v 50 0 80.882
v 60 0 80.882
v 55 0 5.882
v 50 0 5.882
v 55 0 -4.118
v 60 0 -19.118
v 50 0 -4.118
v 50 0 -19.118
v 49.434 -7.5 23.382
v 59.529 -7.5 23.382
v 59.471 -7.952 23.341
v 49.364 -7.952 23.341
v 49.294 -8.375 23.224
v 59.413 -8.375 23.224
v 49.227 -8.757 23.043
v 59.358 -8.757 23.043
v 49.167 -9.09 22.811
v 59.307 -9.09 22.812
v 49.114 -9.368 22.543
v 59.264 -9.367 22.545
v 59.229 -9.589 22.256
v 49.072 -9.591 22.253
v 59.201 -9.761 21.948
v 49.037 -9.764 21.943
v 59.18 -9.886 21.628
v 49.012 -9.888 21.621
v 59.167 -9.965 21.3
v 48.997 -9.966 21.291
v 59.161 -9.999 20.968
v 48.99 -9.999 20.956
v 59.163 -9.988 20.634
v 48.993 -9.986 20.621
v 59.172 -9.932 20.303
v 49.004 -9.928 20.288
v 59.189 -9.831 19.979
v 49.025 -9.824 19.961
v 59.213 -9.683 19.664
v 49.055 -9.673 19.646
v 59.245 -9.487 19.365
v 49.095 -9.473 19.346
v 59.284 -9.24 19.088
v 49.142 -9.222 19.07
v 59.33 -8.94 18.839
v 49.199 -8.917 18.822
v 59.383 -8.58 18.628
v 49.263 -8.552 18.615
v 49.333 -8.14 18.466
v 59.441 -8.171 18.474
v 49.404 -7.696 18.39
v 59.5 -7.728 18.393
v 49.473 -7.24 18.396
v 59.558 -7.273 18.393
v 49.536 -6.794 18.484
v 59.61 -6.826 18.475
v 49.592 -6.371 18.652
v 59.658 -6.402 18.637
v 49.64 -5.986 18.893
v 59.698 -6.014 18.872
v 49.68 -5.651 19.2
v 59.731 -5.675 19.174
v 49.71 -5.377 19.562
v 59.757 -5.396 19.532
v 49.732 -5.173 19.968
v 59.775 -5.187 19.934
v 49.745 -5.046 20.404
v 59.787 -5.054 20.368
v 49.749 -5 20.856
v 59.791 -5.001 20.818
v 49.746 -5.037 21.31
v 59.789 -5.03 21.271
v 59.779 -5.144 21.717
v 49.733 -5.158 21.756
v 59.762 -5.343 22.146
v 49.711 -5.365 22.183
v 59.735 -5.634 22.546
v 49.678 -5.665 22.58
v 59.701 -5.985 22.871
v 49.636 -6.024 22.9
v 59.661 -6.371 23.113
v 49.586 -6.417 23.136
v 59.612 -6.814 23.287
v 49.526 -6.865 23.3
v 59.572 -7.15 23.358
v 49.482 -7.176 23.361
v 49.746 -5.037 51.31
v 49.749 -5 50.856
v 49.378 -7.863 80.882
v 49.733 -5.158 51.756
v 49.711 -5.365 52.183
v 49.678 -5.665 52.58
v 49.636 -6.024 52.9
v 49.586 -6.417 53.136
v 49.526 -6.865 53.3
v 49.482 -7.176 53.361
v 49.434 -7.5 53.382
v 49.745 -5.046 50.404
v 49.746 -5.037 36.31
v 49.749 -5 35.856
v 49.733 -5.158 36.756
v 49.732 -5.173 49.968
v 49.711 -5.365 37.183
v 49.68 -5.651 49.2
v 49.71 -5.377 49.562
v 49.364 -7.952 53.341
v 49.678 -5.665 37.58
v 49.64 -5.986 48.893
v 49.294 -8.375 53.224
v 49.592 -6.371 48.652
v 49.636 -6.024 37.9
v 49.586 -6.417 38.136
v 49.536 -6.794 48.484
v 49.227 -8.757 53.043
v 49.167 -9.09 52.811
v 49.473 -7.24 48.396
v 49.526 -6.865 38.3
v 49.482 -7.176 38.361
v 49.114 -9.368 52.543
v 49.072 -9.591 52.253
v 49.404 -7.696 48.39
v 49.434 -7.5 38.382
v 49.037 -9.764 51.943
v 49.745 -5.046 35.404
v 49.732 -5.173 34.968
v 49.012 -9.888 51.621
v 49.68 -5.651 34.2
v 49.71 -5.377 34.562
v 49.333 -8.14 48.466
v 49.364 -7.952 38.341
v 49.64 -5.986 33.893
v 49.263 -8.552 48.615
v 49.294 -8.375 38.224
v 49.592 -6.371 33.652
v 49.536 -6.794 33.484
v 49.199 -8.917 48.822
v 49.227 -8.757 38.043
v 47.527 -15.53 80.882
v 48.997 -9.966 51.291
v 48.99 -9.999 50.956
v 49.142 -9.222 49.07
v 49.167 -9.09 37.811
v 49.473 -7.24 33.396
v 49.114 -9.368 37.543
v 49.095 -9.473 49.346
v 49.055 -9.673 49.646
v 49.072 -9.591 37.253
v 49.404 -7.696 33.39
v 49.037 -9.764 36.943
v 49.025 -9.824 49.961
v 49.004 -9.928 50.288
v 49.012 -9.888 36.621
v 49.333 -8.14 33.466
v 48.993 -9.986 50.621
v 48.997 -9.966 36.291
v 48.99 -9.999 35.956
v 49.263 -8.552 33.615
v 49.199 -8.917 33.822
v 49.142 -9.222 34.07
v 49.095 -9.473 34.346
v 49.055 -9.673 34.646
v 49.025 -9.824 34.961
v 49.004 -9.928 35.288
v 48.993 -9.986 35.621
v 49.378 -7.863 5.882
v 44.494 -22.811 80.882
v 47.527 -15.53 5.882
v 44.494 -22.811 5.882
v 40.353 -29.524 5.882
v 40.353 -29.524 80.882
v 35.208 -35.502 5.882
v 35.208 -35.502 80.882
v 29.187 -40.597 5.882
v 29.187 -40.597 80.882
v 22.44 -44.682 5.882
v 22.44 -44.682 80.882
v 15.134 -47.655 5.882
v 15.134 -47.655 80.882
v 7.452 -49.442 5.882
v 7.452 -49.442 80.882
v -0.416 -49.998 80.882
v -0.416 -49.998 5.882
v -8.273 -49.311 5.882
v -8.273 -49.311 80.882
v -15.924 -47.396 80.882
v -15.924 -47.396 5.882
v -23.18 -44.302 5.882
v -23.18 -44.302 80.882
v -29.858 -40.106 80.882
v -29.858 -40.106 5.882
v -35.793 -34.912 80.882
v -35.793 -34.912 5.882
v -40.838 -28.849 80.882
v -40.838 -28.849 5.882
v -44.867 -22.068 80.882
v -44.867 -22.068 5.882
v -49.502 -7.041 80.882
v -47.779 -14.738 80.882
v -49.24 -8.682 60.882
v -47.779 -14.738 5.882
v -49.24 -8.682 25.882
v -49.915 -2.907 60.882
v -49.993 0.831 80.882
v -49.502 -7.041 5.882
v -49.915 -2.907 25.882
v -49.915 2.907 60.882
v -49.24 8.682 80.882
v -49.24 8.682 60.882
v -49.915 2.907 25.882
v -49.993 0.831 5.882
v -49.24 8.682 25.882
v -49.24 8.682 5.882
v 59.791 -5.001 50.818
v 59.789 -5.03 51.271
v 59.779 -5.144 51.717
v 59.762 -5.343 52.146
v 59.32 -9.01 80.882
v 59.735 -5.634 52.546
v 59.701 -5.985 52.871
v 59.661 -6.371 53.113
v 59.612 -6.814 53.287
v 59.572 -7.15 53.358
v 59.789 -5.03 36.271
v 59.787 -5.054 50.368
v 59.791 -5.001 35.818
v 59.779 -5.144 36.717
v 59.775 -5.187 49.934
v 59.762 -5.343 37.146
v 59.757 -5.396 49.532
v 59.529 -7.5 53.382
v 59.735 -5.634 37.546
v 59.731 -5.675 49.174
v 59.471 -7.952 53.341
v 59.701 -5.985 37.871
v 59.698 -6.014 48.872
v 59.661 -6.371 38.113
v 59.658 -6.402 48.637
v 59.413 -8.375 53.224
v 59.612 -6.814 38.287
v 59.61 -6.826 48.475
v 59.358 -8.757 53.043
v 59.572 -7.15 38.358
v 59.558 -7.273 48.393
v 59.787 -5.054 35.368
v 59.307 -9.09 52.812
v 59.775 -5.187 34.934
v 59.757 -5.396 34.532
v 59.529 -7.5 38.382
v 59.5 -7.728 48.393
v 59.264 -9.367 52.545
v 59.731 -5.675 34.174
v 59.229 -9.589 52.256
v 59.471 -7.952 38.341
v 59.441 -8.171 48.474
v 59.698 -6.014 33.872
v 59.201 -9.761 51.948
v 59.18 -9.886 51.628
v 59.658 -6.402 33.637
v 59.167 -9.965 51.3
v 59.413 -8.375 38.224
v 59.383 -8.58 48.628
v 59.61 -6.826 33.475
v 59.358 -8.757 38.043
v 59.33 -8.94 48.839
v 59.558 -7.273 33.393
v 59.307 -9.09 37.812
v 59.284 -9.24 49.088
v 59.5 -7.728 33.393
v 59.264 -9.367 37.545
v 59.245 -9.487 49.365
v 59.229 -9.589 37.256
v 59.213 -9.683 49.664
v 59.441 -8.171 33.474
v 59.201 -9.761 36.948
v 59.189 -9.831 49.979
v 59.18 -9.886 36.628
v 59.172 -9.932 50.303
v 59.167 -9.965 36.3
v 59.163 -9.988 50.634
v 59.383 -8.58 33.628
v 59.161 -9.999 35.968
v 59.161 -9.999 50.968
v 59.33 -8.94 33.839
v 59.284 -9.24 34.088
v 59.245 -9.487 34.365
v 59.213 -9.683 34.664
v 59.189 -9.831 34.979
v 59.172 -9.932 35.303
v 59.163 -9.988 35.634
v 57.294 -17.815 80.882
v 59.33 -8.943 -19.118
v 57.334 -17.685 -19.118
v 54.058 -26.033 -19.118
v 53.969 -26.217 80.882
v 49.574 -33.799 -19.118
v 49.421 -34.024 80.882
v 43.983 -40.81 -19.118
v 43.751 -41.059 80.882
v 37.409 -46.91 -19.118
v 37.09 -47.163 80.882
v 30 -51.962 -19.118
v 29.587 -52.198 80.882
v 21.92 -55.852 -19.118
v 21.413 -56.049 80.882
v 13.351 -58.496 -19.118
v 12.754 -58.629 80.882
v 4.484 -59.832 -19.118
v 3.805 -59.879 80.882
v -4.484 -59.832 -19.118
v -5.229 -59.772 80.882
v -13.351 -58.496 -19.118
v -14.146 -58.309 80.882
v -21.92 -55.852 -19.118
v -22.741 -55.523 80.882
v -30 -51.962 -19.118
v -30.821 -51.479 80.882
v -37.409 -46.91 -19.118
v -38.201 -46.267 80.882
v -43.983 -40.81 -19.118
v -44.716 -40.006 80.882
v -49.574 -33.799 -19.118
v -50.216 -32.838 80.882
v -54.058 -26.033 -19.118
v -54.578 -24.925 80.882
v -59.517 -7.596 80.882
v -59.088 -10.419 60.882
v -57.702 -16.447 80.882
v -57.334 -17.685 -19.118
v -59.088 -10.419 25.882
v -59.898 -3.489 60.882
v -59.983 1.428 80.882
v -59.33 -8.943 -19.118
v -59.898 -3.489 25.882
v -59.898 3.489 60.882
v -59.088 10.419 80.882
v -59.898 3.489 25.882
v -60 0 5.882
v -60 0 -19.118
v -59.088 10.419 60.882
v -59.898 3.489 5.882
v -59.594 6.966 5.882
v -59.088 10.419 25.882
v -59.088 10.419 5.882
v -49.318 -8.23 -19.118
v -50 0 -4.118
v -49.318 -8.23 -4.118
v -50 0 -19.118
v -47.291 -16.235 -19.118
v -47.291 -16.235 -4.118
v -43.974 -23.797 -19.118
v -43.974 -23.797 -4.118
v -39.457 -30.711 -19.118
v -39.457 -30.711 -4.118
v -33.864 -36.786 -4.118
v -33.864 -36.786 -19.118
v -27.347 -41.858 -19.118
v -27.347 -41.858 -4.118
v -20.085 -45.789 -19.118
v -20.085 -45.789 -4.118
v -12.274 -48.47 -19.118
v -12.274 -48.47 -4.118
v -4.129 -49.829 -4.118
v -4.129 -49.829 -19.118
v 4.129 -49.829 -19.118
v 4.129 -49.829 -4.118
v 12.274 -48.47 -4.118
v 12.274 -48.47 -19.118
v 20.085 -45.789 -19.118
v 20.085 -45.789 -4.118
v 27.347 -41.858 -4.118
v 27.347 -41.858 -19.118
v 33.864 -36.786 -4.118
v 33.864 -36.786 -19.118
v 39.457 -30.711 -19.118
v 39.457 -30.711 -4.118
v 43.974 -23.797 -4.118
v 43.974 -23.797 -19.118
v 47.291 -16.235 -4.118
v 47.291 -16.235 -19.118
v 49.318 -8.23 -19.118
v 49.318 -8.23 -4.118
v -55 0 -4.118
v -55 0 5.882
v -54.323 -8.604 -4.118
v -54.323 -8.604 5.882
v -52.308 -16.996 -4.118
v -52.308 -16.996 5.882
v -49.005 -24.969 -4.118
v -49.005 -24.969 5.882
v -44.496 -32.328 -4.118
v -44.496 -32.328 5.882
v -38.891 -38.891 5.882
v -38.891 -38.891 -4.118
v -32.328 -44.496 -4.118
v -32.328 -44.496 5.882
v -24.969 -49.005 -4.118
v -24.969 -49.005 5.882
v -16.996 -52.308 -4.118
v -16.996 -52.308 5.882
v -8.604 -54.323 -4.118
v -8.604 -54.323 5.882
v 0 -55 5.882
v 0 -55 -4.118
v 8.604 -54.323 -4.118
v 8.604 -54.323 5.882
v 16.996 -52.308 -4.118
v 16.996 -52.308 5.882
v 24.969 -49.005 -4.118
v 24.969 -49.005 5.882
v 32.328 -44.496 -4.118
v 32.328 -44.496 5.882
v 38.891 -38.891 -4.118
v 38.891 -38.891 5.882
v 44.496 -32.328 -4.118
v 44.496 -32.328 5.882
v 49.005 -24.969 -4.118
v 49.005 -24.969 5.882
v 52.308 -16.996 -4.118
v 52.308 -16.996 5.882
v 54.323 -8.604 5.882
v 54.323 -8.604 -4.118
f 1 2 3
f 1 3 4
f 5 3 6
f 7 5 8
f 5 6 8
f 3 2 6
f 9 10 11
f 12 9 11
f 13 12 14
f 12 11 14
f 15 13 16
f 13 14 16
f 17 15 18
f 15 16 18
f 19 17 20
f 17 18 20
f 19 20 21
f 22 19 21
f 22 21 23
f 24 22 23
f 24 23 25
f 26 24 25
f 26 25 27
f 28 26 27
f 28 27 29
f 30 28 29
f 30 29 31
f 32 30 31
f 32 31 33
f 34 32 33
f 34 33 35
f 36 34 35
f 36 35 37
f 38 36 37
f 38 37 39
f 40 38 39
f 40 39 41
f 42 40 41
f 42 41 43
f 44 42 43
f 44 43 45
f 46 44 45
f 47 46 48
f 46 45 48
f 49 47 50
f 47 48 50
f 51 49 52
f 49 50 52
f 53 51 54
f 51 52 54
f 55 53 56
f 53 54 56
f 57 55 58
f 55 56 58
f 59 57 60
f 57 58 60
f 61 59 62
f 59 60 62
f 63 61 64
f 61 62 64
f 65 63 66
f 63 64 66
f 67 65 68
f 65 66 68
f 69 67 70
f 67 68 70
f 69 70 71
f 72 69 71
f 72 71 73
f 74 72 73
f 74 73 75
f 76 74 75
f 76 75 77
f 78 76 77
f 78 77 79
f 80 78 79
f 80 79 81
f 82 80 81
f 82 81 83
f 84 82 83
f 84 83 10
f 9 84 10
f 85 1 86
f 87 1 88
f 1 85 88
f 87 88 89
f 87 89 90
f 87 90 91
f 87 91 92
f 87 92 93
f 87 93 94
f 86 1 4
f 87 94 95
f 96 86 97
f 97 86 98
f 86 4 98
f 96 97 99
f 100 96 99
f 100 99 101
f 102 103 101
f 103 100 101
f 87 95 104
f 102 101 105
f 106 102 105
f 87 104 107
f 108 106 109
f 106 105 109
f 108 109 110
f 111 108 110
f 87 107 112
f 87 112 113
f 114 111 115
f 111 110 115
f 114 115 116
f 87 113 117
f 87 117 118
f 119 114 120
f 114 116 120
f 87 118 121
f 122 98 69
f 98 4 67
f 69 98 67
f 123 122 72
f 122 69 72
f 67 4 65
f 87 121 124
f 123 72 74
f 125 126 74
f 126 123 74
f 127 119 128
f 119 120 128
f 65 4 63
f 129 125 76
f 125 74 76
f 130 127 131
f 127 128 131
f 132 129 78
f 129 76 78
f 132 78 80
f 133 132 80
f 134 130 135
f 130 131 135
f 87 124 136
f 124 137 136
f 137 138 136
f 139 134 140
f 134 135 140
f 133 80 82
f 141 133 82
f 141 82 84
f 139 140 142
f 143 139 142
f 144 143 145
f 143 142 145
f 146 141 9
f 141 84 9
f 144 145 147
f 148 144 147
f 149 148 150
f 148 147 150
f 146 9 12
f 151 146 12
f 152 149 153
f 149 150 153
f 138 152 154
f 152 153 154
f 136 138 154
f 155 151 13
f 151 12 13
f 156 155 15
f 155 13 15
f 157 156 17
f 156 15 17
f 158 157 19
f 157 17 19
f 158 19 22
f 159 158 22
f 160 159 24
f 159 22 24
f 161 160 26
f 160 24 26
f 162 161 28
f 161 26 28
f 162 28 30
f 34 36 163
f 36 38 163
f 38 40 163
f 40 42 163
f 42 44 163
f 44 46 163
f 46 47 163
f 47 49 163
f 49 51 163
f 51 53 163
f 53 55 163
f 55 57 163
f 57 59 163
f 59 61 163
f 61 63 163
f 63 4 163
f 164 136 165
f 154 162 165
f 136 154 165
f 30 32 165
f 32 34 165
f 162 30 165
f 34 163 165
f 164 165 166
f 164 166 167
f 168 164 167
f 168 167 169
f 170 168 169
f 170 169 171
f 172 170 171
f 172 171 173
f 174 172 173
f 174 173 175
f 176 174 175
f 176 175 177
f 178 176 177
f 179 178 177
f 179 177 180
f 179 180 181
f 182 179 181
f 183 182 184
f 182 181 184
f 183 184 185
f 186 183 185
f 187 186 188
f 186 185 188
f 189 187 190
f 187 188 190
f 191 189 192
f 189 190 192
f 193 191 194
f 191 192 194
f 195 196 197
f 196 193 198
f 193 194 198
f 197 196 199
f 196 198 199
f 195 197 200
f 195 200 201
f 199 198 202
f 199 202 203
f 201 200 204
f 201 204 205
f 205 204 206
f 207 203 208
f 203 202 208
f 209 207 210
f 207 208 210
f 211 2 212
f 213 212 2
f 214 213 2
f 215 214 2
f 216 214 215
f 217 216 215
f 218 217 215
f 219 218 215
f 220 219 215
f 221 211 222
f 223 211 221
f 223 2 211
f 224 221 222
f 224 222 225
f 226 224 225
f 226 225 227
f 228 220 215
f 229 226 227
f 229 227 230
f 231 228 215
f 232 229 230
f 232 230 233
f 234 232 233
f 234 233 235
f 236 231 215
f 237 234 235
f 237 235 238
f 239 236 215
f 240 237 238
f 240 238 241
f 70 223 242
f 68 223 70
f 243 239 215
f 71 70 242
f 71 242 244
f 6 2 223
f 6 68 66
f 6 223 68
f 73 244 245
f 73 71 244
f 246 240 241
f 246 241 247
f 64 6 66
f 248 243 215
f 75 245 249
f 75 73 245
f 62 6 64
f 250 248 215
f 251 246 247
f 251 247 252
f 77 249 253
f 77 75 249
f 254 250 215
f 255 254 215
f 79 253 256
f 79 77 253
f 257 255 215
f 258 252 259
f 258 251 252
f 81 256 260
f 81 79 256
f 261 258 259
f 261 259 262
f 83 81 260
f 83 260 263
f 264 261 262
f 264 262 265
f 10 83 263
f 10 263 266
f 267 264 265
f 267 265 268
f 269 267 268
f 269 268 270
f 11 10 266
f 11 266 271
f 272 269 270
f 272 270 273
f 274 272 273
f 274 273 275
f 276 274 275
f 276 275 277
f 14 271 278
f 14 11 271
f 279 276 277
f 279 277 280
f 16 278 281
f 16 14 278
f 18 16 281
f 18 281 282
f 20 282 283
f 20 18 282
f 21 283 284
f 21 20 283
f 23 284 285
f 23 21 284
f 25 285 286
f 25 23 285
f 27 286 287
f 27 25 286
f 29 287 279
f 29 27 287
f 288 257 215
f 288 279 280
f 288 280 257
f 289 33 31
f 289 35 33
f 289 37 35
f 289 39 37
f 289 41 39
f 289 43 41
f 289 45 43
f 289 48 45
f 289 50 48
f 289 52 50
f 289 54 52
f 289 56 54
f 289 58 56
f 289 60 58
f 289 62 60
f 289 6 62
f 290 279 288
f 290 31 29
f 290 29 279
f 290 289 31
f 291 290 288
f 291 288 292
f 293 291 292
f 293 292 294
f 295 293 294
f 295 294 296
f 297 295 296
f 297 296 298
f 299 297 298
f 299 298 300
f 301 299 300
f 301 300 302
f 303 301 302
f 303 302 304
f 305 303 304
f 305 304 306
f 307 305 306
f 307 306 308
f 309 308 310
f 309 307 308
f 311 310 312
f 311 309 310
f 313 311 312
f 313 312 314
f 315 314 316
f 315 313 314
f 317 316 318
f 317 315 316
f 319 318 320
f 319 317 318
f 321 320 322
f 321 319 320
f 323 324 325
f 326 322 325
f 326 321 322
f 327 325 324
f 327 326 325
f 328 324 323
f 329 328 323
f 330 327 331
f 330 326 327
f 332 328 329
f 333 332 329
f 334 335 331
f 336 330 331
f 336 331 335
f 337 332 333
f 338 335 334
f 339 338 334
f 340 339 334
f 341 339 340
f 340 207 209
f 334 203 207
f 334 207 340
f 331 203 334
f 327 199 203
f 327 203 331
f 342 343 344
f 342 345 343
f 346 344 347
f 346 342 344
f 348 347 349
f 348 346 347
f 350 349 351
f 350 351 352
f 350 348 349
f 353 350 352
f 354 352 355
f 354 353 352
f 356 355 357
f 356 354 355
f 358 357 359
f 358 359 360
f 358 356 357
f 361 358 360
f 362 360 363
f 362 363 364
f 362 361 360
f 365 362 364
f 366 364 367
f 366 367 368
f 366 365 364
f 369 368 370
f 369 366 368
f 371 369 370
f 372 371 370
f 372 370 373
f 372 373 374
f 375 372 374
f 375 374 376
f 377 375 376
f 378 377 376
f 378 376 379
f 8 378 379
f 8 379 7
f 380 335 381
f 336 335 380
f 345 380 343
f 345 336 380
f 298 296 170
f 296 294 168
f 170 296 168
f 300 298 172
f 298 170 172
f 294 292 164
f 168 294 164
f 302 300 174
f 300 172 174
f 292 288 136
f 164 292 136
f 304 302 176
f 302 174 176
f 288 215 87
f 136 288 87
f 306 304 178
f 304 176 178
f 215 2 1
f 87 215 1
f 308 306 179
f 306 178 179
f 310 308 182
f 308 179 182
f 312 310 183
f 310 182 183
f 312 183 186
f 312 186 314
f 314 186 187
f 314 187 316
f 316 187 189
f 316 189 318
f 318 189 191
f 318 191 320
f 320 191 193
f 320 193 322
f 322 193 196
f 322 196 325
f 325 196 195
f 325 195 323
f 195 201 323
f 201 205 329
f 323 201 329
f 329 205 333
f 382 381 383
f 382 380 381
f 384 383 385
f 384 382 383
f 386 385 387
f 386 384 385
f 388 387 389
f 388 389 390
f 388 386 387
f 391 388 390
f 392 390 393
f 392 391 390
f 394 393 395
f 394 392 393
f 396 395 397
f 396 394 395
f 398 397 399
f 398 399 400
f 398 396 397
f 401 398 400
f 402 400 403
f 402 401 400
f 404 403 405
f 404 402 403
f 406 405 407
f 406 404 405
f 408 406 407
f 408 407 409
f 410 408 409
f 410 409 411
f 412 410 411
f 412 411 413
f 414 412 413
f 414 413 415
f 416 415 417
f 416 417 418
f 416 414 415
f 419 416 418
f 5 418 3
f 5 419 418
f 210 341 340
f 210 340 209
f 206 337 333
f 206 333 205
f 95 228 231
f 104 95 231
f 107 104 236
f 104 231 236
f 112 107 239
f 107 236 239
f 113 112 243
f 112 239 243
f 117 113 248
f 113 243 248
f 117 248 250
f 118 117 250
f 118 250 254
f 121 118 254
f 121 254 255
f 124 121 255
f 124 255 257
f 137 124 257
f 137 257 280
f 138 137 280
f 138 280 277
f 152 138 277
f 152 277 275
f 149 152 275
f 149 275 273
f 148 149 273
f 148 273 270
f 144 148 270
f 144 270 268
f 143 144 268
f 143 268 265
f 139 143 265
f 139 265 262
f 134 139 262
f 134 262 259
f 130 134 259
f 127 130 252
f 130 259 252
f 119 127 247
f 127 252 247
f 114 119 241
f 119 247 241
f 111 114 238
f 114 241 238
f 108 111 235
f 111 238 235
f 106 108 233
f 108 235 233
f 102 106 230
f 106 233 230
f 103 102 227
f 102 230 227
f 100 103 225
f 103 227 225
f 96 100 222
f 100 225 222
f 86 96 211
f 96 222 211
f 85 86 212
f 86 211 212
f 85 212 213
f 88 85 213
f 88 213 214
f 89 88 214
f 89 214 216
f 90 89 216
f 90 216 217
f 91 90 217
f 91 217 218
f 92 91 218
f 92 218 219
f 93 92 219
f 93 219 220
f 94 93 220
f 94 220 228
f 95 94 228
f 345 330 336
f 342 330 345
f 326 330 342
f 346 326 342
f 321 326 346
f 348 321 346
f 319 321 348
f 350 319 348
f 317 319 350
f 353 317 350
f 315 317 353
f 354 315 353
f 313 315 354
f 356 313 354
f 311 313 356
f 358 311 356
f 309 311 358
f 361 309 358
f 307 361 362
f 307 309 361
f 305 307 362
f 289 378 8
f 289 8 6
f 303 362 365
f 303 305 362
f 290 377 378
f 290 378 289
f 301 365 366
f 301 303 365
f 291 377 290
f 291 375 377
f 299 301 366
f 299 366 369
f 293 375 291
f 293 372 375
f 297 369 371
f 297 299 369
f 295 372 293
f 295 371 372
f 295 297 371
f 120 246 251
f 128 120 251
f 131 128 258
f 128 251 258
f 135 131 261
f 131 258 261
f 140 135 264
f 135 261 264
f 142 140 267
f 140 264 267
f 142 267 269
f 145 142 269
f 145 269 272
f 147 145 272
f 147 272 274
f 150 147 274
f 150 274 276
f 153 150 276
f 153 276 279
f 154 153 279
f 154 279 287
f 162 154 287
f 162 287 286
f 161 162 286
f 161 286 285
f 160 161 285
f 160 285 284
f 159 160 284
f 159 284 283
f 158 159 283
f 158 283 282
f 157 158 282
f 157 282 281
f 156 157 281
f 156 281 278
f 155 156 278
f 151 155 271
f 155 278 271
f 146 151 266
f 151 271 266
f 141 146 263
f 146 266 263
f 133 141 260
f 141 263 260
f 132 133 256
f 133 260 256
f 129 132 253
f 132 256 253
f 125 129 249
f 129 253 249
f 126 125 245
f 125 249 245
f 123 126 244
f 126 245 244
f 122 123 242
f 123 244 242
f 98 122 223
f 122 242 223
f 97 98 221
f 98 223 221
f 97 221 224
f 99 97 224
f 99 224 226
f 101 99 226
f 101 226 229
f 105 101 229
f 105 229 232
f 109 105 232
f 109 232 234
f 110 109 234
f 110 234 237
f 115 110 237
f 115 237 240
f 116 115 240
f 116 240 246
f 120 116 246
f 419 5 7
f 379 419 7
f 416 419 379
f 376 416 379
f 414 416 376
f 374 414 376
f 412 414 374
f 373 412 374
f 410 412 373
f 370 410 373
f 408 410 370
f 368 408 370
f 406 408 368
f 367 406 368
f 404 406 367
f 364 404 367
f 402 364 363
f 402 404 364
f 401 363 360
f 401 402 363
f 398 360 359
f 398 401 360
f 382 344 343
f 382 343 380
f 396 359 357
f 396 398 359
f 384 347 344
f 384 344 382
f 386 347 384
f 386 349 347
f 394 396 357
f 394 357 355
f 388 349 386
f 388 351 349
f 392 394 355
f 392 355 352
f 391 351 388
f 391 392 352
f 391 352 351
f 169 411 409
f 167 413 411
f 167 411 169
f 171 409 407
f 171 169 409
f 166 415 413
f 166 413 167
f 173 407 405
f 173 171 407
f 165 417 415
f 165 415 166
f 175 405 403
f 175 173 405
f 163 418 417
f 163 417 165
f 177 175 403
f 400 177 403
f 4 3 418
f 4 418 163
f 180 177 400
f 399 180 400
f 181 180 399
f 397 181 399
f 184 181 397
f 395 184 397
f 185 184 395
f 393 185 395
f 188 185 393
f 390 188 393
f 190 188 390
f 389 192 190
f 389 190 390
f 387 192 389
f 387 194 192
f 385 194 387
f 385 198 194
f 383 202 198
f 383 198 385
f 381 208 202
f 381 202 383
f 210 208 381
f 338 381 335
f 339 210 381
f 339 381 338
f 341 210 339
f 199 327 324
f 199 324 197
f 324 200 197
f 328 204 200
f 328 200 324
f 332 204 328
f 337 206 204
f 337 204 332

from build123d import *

# Parameters (mm, degrees)
REVOLVE1_ANGLE     = 180
SKETCH2_W          = 10
SKETCH2_H          = 35
CUT_REVOLVE1_ANGLE = 10
SKETCH4_R          = 2.5
CUT_EXTRUDE1_DEPTH = 20
SKETCH5_W          = 10
SKETCH5_H          = 20
REVOLVE2_ANGLE     = 10


with BuildPart() as part:
    # Sketch1 → Revolve1 (revolve)
    with BuildSketch(Plane(origin=(0, 0, 0), x_dir=(1, 0, 0), z_dir=(0, 1, 0))):
        Polygon((-60, 19.117647059), (-60, -80.882352941), (-50, -80.882352941), (-50, -5.882352941), (-55, -5.882352941), (-55, 4.117647059), (-50, 4.117647059), (-50, 19.117647059), align=None)
    revolve(axis=Axis((0, 0, -69.117647059), (0, 0, 1)), revolution_arc=REVOLVE1_ANGLE)

    # Sketch2 → Cut-Revolve1 (revolve, cut)
    with BuildSketch(Plane(origin=(0, 0, 0), x_dir=(1, 0, 0), z_dir=(0, 1, 0))):
        with Locations((-55, -43.382352941)):
            Rectangle(SKETCH2_W, SKETCH2_H)
    revolve(axis=Axis((0, 0, 80.882352941), (0, 0, 1)), revolution_arc=CUT_REVOLVE1_ANGLE, mode=Mode.SUBTRACT)

    # Sketch4 → Cut-Extrude1 (cut)
    with BuildSketch(Plane(origin=(60, 0, 0), x_dir=(0, 0, 1), z_dir=(1, 0, 0))):
        with Locations((35.882352941, 7.5)):
            Circle(SKETCH4_R)
        with Locations((50.882352941, 7.5)):
            Circle(SKETCH4_R)
        with Locations((20.882352941, 7.5)):
            Circle(SKETCH4_R)
    extrude(amount=-CUT_EXTRUDE1_DEPTH, mode=Mode.SUBTRACT)

    # Sketch5 → Revolve2 (revolve)
    with BuildSketch(Plane(origin=(0, 0, 0), x_dir=(1, 0, 0), z_dir=(0, 1, 0))):
        with Locations((-55, -70.882352941)):
            Rectangle(SKETCH5_W, SKETCH5_H)
        with Locations((-55, -15.882352941)):
            Rectangle(SKETCH5_W, SKETCH5_H)
    revolve(axis=Axis((0, 0, 85.860952493), (0, 0, -1)), revolution_arc=REVOLVE2_ANGLE)


solid = part.part
